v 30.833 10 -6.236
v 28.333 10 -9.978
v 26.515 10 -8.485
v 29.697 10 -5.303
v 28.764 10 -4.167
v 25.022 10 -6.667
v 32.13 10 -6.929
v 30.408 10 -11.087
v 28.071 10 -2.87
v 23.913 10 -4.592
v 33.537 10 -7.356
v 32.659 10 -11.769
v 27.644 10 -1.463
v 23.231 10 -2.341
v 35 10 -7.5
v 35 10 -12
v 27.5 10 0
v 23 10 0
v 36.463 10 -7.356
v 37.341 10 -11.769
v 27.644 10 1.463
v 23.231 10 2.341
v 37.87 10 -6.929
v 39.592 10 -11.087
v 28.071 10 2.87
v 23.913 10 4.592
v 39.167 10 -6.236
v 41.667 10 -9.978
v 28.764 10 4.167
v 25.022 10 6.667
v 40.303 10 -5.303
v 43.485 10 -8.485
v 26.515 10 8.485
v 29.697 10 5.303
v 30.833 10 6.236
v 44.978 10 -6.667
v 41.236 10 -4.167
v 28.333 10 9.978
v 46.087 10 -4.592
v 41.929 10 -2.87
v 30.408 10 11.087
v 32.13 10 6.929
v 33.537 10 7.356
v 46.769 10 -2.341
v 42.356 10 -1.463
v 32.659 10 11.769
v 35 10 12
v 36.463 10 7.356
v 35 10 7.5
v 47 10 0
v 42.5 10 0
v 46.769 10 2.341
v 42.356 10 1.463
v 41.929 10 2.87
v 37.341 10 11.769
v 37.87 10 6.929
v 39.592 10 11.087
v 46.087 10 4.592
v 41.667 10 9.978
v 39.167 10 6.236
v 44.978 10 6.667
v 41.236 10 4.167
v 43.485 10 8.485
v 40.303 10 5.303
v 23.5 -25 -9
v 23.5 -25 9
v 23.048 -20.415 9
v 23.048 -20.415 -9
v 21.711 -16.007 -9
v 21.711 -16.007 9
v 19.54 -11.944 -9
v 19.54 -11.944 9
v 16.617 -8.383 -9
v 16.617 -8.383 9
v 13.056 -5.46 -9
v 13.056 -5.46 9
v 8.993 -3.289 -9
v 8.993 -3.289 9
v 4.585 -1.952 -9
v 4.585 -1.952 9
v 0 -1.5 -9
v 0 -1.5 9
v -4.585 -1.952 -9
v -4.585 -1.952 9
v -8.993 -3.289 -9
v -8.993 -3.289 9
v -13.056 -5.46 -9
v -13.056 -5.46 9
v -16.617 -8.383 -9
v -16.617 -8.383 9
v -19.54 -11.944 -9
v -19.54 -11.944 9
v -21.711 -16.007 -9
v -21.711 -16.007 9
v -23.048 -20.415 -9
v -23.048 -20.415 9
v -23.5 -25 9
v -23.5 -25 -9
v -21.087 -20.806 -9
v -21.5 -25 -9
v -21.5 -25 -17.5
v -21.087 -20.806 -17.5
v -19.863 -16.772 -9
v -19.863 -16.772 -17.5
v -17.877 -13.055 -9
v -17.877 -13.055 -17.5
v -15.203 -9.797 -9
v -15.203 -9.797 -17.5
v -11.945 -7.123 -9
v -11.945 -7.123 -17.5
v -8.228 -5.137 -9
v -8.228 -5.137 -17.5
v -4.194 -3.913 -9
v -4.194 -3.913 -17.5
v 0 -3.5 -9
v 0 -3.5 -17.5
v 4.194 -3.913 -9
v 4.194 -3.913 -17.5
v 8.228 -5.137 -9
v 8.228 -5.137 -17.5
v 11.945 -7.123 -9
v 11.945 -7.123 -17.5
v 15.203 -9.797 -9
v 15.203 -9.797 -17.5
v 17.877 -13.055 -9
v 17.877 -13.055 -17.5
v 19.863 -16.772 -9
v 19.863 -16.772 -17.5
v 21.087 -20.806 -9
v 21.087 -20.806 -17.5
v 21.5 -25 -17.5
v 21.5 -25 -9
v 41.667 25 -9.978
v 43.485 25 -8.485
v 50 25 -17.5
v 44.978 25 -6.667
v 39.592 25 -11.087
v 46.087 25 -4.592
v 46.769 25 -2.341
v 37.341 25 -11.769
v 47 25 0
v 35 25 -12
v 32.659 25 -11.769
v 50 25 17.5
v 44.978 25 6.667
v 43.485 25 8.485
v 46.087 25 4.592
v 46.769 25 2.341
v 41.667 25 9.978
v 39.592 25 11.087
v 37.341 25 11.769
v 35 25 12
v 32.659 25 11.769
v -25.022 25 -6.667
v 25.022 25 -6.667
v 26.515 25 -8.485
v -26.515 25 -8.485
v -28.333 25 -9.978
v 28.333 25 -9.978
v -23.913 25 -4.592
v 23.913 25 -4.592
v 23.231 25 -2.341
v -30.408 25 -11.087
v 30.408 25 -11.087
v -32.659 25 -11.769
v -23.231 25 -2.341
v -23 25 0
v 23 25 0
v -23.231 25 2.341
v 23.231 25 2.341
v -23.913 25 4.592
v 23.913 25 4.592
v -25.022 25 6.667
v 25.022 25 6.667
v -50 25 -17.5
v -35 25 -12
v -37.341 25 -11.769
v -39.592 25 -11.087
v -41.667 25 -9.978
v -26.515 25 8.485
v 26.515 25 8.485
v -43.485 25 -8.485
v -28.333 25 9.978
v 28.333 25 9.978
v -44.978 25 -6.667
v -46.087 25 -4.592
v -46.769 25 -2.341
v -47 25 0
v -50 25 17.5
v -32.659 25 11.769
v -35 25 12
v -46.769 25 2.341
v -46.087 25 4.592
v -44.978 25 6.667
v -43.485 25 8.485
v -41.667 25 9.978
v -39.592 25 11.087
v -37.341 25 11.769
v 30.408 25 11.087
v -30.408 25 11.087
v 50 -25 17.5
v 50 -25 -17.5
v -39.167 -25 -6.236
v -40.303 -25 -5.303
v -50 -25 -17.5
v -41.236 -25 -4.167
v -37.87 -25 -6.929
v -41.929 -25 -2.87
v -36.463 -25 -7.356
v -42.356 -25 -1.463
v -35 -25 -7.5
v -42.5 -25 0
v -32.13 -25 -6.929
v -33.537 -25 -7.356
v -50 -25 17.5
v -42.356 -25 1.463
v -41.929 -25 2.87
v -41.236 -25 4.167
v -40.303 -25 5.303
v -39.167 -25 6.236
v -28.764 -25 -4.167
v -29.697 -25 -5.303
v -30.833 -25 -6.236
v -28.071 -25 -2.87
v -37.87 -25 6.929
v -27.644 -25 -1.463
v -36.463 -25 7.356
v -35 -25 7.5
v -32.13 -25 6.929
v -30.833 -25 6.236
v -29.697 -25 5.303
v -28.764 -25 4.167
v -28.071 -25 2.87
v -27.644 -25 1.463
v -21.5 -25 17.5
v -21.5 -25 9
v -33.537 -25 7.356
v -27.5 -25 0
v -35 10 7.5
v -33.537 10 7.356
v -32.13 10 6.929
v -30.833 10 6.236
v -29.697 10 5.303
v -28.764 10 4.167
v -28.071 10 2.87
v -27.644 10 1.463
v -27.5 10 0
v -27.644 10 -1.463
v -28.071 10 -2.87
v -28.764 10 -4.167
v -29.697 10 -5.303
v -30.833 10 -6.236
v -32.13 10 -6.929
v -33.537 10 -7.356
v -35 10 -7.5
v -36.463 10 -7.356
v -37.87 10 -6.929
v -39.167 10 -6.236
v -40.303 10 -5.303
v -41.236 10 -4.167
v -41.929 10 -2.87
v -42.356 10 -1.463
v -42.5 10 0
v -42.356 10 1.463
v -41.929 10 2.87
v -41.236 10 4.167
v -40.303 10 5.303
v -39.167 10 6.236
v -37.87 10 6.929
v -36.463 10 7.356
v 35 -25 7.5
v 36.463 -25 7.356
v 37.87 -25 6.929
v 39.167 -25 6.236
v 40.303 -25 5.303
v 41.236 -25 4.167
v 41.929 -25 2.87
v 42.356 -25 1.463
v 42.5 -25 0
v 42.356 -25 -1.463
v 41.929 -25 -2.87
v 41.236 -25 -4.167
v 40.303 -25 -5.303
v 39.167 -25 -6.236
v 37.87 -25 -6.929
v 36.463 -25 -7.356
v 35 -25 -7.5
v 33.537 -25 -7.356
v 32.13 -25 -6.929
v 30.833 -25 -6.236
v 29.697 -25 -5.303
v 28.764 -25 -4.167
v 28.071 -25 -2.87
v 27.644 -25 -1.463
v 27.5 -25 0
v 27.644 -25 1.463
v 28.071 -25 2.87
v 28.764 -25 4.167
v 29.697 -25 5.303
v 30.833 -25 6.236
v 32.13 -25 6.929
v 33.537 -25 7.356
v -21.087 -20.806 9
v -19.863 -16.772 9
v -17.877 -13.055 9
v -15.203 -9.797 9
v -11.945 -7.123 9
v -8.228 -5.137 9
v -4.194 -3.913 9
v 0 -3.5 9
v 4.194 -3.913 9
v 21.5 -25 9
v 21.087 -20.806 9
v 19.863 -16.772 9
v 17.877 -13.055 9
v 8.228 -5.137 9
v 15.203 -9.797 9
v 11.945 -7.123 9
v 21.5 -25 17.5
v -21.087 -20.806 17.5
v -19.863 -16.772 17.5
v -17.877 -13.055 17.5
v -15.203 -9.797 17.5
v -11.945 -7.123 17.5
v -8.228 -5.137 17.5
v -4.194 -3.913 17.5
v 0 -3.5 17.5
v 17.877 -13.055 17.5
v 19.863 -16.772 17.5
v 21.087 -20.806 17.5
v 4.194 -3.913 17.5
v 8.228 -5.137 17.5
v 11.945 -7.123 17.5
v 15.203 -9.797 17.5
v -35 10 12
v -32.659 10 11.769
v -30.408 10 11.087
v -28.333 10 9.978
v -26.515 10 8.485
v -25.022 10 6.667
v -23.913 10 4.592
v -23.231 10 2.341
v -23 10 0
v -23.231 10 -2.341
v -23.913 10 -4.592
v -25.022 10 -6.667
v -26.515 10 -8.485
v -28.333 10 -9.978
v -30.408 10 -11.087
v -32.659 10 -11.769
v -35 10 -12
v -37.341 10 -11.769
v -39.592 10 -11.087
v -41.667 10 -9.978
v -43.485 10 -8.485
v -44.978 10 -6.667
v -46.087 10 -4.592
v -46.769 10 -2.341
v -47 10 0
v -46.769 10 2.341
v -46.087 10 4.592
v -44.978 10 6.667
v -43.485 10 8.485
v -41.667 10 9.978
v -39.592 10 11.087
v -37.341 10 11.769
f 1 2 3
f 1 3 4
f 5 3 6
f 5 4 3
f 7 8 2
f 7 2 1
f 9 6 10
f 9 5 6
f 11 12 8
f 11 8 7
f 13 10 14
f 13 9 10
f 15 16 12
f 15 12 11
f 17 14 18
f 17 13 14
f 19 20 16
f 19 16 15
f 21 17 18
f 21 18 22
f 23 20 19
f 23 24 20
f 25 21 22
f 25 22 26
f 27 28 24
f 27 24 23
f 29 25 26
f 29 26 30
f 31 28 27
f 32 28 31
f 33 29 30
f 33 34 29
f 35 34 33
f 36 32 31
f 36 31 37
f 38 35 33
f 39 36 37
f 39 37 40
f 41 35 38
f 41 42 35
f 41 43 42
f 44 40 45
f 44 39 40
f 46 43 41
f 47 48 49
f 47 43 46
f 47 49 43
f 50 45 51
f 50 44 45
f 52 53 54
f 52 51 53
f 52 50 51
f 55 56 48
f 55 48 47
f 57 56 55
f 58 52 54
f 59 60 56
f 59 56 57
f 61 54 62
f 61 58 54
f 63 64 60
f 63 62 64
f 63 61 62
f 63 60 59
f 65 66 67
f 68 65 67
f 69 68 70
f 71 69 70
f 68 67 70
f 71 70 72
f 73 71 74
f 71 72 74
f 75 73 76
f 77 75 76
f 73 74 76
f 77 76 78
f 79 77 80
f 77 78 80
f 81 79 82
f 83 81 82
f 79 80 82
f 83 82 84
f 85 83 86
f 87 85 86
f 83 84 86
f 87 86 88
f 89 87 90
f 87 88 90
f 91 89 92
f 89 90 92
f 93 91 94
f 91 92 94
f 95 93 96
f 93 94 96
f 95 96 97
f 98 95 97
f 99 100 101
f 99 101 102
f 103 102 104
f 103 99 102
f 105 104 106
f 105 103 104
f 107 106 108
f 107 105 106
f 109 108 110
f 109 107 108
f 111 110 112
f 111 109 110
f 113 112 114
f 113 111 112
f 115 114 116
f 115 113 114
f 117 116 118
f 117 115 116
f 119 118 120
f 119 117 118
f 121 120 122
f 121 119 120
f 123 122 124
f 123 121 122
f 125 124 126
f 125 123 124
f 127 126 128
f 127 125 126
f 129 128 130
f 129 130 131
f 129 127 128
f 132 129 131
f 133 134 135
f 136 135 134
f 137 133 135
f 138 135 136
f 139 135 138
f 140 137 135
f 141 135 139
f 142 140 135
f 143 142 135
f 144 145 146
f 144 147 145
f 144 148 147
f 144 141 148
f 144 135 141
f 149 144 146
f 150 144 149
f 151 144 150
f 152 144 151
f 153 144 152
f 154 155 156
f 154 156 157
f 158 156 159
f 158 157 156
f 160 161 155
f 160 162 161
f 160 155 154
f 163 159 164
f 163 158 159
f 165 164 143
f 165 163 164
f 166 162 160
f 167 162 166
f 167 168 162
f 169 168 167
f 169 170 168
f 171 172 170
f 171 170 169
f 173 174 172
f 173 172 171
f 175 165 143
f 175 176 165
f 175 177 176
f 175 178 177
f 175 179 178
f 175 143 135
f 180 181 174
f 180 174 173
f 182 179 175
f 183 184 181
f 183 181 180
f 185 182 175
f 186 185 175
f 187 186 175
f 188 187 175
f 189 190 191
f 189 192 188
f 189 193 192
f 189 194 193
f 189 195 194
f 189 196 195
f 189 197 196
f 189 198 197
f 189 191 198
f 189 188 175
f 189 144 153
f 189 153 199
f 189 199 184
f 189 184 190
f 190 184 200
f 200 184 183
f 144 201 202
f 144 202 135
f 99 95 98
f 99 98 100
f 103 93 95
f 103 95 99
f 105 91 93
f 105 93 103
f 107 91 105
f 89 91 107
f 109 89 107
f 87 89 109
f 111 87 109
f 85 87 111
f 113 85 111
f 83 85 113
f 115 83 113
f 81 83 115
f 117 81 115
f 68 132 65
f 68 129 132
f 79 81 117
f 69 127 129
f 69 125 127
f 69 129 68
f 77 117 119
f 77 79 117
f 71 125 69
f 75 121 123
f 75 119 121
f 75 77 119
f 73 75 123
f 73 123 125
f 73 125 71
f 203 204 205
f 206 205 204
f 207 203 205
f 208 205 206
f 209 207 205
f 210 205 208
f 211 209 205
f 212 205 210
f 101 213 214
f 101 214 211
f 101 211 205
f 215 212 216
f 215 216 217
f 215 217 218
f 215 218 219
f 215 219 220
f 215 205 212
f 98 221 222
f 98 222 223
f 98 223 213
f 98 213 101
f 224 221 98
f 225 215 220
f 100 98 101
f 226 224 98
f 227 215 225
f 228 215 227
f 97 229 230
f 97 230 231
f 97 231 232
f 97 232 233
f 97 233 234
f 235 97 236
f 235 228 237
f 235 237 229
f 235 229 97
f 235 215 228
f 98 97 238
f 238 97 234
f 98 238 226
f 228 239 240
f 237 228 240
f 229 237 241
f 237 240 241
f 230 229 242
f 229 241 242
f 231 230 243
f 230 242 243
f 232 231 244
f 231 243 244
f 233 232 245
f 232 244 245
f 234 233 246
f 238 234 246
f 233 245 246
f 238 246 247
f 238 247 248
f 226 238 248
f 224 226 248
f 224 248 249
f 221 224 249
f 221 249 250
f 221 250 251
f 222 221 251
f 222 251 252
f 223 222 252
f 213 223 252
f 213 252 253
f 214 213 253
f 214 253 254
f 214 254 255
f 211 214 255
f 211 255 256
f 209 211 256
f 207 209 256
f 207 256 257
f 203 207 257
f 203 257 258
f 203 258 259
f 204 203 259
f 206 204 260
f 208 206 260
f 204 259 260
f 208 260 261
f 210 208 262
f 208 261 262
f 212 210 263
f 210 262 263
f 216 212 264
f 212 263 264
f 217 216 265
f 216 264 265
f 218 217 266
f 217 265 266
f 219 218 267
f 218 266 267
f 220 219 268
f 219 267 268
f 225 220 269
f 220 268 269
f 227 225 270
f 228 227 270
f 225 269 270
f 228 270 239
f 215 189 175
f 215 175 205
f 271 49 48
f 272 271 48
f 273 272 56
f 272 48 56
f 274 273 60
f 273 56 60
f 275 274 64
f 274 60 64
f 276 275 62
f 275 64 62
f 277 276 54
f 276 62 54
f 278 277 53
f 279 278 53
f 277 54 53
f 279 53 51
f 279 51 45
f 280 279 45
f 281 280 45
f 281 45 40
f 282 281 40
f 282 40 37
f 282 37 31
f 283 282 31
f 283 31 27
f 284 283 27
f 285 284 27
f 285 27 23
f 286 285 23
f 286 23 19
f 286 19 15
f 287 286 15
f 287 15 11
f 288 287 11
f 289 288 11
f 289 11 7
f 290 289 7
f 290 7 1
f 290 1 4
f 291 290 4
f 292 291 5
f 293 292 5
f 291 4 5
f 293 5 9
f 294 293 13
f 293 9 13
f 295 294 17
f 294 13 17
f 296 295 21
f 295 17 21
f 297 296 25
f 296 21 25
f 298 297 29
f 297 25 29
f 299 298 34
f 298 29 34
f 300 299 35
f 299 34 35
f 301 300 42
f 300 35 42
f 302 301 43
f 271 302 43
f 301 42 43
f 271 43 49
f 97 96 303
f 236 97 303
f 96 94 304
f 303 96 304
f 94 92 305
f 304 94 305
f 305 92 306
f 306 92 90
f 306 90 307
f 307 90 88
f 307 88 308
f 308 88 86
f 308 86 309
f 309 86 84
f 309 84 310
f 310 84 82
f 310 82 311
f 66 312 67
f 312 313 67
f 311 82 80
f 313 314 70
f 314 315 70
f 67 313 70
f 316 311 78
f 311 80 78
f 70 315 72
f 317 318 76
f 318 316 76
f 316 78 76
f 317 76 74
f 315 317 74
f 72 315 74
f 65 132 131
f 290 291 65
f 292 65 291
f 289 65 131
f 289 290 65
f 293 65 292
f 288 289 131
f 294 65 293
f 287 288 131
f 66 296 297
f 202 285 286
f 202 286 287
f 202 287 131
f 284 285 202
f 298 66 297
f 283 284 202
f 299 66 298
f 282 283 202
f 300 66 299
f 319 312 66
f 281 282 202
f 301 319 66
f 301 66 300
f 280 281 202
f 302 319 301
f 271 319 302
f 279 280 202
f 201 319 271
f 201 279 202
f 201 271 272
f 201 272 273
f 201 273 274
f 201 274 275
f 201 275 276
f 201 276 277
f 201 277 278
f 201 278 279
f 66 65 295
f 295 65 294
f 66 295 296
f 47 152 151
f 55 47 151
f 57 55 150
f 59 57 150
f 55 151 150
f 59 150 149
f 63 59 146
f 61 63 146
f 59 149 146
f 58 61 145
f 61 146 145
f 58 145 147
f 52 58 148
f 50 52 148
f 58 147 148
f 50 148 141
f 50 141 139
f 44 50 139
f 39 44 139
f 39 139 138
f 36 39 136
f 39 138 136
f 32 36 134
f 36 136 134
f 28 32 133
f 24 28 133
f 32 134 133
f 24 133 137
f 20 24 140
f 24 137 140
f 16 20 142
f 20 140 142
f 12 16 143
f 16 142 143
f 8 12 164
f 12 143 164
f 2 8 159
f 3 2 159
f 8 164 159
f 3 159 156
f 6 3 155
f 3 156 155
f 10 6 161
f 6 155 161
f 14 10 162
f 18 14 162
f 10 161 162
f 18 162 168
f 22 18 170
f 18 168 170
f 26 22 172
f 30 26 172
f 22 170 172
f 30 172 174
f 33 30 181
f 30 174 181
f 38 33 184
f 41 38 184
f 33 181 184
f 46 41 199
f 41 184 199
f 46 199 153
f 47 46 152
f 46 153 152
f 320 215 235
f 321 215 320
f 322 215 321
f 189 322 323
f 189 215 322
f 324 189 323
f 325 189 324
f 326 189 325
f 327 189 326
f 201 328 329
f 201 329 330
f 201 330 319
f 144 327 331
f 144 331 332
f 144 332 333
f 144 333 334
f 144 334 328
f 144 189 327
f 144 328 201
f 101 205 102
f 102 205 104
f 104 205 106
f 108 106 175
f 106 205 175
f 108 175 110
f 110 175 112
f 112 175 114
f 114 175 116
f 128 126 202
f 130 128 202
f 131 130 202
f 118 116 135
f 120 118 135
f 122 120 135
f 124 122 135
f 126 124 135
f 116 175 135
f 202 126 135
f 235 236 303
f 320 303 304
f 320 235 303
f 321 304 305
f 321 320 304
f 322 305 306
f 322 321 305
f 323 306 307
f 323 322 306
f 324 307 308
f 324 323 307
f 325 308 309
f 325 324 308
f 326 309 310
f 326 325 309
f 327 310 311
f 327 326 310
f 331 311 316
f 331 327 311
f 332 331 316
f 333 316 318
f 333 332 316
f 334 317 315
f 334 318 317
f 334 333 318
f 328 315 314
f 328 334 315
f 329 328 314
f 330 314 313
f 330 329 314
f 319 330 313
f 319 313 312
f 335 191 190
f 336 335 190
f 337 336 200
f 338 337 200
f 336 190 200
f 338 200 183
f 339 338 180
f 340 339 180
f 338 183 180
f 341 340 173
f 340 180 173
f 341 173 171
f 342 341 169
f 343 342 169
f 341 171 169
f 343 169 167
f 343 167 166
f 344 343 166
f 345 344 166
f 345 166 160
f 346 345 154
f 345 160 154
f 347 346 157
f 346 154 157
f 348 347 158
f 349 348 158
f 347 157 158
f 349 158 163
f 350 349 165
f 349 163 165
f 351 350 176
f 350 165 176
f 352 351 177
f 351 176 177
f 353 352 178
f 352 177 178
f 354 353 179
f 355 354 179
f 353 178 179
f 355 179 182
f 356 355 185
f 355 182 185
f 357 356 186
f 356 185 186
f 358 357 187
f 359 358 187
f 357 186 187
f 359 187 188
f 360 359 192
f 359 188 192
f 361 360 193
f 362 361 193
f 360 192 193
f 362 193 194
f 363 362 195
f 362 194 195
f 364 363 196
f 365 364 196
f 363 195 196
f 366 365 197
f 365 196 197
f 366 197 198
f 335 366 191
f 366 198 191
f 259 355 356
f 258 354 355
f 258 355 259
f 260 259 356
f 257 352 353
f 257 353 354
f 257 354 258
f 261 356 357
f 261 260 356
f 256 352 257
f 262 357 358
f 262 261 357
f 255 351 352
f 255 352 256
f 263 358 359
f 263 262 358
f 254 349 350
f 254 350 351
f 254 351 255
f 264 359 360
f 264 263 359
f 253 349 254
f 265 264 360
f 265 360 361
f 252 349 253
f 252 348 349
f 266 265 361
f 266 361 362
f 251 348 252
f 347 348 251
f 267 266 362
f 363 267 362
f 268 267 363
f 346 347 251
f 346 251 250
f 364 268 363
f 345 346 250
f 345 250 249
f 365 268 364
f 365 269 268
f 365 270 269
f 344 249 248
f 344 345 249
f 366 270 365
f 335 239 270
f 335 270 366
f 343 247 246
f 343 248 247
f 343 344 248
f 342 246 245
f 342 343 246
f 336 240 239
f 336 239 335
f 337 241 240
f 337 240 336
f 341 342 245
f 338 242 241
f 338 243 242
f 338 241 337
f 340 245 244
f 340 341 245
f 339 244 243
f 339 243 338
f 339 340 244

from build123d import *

# Parameters (mm, degrees)
EXTRUDE_1_DEPTH     = 17.5
SKETCH_2_R          = 7.5
CUT_EXTRUDE_1_DEPTH = 73.844011422
SKETCH_3_R          = 12
CUT_EXTRUDE_2_DEPTH = 15
SKETCH_4_R          = 23.5
CUT_EXTRUDE_3_DEPTH = 9


with BuildPart() as part:
    # 草图1 → 凸台-拉伸1 (new, symmetric)
    with BuildSketch(Plane.XY):
        with BuildLine():
            Line((21.5, -25), (50, -25))
            Line((50, -25), (50, 25))
            Line((50, 25), (-50, 25))
            Line((-50, 25), (-50, -25))
            Line((-50, -25), (-21.5, -25))
            ThreePointArc((-21.5, -25), (0, -3.5), (21.5, -25))
        make_face()
    extrude(amount=EXTRUDE_1_DEPTH, both=True)

    # 草图2 → 切除-拉伸1 (cut, through all)
    with BuildSketch(Plane(origin=(0, 25, 0), x_dir=(1, 0, 0), z_dir=(0, 1, 0))):
        with Locations(Location((-35, 0, 0), (0, 0, 270))):
            Circle(SKETCH_2_R)
        with Locations(Location((35, 0, 0), (0, 0, 270))):
            Circle(SKETCH_2_R)
    extrude(amount=-CUT_EXTRUDE_1_DEPTH, mode=Mode.SUBTRACT)

    # 草图3 → 切除-拉伸2 (cut)
    with BuildSketch(Plane(origin=(0, 25, 0), x_dir=(1, 0, 0), z_dir=(0, 1, 0))):
        with Locations(Location((-35, 0, 0), (0, 0, 270))):
            Circle(SKETCH_3_R)
        with Locations(Location((35, 0, 0), (0, 0, 270))):
            Circle(SKETCH_3_R)
    extrude(amount=-CUT_EXTRUDE_2_DEPTH, mode=Mode.SUBTRACT)

    # 草图4 → 切除-拉伸3 (cut, symmetric)
    with BuildSketch(Plane.XY):
        with Locations((0, -25)):
            Circle(SKETCH_4_R)
    extrude(amount=CUT_EXTRUDE_3_DEPTH, both=True, mode=Mode.SUBTRACT)


solid = part.part
